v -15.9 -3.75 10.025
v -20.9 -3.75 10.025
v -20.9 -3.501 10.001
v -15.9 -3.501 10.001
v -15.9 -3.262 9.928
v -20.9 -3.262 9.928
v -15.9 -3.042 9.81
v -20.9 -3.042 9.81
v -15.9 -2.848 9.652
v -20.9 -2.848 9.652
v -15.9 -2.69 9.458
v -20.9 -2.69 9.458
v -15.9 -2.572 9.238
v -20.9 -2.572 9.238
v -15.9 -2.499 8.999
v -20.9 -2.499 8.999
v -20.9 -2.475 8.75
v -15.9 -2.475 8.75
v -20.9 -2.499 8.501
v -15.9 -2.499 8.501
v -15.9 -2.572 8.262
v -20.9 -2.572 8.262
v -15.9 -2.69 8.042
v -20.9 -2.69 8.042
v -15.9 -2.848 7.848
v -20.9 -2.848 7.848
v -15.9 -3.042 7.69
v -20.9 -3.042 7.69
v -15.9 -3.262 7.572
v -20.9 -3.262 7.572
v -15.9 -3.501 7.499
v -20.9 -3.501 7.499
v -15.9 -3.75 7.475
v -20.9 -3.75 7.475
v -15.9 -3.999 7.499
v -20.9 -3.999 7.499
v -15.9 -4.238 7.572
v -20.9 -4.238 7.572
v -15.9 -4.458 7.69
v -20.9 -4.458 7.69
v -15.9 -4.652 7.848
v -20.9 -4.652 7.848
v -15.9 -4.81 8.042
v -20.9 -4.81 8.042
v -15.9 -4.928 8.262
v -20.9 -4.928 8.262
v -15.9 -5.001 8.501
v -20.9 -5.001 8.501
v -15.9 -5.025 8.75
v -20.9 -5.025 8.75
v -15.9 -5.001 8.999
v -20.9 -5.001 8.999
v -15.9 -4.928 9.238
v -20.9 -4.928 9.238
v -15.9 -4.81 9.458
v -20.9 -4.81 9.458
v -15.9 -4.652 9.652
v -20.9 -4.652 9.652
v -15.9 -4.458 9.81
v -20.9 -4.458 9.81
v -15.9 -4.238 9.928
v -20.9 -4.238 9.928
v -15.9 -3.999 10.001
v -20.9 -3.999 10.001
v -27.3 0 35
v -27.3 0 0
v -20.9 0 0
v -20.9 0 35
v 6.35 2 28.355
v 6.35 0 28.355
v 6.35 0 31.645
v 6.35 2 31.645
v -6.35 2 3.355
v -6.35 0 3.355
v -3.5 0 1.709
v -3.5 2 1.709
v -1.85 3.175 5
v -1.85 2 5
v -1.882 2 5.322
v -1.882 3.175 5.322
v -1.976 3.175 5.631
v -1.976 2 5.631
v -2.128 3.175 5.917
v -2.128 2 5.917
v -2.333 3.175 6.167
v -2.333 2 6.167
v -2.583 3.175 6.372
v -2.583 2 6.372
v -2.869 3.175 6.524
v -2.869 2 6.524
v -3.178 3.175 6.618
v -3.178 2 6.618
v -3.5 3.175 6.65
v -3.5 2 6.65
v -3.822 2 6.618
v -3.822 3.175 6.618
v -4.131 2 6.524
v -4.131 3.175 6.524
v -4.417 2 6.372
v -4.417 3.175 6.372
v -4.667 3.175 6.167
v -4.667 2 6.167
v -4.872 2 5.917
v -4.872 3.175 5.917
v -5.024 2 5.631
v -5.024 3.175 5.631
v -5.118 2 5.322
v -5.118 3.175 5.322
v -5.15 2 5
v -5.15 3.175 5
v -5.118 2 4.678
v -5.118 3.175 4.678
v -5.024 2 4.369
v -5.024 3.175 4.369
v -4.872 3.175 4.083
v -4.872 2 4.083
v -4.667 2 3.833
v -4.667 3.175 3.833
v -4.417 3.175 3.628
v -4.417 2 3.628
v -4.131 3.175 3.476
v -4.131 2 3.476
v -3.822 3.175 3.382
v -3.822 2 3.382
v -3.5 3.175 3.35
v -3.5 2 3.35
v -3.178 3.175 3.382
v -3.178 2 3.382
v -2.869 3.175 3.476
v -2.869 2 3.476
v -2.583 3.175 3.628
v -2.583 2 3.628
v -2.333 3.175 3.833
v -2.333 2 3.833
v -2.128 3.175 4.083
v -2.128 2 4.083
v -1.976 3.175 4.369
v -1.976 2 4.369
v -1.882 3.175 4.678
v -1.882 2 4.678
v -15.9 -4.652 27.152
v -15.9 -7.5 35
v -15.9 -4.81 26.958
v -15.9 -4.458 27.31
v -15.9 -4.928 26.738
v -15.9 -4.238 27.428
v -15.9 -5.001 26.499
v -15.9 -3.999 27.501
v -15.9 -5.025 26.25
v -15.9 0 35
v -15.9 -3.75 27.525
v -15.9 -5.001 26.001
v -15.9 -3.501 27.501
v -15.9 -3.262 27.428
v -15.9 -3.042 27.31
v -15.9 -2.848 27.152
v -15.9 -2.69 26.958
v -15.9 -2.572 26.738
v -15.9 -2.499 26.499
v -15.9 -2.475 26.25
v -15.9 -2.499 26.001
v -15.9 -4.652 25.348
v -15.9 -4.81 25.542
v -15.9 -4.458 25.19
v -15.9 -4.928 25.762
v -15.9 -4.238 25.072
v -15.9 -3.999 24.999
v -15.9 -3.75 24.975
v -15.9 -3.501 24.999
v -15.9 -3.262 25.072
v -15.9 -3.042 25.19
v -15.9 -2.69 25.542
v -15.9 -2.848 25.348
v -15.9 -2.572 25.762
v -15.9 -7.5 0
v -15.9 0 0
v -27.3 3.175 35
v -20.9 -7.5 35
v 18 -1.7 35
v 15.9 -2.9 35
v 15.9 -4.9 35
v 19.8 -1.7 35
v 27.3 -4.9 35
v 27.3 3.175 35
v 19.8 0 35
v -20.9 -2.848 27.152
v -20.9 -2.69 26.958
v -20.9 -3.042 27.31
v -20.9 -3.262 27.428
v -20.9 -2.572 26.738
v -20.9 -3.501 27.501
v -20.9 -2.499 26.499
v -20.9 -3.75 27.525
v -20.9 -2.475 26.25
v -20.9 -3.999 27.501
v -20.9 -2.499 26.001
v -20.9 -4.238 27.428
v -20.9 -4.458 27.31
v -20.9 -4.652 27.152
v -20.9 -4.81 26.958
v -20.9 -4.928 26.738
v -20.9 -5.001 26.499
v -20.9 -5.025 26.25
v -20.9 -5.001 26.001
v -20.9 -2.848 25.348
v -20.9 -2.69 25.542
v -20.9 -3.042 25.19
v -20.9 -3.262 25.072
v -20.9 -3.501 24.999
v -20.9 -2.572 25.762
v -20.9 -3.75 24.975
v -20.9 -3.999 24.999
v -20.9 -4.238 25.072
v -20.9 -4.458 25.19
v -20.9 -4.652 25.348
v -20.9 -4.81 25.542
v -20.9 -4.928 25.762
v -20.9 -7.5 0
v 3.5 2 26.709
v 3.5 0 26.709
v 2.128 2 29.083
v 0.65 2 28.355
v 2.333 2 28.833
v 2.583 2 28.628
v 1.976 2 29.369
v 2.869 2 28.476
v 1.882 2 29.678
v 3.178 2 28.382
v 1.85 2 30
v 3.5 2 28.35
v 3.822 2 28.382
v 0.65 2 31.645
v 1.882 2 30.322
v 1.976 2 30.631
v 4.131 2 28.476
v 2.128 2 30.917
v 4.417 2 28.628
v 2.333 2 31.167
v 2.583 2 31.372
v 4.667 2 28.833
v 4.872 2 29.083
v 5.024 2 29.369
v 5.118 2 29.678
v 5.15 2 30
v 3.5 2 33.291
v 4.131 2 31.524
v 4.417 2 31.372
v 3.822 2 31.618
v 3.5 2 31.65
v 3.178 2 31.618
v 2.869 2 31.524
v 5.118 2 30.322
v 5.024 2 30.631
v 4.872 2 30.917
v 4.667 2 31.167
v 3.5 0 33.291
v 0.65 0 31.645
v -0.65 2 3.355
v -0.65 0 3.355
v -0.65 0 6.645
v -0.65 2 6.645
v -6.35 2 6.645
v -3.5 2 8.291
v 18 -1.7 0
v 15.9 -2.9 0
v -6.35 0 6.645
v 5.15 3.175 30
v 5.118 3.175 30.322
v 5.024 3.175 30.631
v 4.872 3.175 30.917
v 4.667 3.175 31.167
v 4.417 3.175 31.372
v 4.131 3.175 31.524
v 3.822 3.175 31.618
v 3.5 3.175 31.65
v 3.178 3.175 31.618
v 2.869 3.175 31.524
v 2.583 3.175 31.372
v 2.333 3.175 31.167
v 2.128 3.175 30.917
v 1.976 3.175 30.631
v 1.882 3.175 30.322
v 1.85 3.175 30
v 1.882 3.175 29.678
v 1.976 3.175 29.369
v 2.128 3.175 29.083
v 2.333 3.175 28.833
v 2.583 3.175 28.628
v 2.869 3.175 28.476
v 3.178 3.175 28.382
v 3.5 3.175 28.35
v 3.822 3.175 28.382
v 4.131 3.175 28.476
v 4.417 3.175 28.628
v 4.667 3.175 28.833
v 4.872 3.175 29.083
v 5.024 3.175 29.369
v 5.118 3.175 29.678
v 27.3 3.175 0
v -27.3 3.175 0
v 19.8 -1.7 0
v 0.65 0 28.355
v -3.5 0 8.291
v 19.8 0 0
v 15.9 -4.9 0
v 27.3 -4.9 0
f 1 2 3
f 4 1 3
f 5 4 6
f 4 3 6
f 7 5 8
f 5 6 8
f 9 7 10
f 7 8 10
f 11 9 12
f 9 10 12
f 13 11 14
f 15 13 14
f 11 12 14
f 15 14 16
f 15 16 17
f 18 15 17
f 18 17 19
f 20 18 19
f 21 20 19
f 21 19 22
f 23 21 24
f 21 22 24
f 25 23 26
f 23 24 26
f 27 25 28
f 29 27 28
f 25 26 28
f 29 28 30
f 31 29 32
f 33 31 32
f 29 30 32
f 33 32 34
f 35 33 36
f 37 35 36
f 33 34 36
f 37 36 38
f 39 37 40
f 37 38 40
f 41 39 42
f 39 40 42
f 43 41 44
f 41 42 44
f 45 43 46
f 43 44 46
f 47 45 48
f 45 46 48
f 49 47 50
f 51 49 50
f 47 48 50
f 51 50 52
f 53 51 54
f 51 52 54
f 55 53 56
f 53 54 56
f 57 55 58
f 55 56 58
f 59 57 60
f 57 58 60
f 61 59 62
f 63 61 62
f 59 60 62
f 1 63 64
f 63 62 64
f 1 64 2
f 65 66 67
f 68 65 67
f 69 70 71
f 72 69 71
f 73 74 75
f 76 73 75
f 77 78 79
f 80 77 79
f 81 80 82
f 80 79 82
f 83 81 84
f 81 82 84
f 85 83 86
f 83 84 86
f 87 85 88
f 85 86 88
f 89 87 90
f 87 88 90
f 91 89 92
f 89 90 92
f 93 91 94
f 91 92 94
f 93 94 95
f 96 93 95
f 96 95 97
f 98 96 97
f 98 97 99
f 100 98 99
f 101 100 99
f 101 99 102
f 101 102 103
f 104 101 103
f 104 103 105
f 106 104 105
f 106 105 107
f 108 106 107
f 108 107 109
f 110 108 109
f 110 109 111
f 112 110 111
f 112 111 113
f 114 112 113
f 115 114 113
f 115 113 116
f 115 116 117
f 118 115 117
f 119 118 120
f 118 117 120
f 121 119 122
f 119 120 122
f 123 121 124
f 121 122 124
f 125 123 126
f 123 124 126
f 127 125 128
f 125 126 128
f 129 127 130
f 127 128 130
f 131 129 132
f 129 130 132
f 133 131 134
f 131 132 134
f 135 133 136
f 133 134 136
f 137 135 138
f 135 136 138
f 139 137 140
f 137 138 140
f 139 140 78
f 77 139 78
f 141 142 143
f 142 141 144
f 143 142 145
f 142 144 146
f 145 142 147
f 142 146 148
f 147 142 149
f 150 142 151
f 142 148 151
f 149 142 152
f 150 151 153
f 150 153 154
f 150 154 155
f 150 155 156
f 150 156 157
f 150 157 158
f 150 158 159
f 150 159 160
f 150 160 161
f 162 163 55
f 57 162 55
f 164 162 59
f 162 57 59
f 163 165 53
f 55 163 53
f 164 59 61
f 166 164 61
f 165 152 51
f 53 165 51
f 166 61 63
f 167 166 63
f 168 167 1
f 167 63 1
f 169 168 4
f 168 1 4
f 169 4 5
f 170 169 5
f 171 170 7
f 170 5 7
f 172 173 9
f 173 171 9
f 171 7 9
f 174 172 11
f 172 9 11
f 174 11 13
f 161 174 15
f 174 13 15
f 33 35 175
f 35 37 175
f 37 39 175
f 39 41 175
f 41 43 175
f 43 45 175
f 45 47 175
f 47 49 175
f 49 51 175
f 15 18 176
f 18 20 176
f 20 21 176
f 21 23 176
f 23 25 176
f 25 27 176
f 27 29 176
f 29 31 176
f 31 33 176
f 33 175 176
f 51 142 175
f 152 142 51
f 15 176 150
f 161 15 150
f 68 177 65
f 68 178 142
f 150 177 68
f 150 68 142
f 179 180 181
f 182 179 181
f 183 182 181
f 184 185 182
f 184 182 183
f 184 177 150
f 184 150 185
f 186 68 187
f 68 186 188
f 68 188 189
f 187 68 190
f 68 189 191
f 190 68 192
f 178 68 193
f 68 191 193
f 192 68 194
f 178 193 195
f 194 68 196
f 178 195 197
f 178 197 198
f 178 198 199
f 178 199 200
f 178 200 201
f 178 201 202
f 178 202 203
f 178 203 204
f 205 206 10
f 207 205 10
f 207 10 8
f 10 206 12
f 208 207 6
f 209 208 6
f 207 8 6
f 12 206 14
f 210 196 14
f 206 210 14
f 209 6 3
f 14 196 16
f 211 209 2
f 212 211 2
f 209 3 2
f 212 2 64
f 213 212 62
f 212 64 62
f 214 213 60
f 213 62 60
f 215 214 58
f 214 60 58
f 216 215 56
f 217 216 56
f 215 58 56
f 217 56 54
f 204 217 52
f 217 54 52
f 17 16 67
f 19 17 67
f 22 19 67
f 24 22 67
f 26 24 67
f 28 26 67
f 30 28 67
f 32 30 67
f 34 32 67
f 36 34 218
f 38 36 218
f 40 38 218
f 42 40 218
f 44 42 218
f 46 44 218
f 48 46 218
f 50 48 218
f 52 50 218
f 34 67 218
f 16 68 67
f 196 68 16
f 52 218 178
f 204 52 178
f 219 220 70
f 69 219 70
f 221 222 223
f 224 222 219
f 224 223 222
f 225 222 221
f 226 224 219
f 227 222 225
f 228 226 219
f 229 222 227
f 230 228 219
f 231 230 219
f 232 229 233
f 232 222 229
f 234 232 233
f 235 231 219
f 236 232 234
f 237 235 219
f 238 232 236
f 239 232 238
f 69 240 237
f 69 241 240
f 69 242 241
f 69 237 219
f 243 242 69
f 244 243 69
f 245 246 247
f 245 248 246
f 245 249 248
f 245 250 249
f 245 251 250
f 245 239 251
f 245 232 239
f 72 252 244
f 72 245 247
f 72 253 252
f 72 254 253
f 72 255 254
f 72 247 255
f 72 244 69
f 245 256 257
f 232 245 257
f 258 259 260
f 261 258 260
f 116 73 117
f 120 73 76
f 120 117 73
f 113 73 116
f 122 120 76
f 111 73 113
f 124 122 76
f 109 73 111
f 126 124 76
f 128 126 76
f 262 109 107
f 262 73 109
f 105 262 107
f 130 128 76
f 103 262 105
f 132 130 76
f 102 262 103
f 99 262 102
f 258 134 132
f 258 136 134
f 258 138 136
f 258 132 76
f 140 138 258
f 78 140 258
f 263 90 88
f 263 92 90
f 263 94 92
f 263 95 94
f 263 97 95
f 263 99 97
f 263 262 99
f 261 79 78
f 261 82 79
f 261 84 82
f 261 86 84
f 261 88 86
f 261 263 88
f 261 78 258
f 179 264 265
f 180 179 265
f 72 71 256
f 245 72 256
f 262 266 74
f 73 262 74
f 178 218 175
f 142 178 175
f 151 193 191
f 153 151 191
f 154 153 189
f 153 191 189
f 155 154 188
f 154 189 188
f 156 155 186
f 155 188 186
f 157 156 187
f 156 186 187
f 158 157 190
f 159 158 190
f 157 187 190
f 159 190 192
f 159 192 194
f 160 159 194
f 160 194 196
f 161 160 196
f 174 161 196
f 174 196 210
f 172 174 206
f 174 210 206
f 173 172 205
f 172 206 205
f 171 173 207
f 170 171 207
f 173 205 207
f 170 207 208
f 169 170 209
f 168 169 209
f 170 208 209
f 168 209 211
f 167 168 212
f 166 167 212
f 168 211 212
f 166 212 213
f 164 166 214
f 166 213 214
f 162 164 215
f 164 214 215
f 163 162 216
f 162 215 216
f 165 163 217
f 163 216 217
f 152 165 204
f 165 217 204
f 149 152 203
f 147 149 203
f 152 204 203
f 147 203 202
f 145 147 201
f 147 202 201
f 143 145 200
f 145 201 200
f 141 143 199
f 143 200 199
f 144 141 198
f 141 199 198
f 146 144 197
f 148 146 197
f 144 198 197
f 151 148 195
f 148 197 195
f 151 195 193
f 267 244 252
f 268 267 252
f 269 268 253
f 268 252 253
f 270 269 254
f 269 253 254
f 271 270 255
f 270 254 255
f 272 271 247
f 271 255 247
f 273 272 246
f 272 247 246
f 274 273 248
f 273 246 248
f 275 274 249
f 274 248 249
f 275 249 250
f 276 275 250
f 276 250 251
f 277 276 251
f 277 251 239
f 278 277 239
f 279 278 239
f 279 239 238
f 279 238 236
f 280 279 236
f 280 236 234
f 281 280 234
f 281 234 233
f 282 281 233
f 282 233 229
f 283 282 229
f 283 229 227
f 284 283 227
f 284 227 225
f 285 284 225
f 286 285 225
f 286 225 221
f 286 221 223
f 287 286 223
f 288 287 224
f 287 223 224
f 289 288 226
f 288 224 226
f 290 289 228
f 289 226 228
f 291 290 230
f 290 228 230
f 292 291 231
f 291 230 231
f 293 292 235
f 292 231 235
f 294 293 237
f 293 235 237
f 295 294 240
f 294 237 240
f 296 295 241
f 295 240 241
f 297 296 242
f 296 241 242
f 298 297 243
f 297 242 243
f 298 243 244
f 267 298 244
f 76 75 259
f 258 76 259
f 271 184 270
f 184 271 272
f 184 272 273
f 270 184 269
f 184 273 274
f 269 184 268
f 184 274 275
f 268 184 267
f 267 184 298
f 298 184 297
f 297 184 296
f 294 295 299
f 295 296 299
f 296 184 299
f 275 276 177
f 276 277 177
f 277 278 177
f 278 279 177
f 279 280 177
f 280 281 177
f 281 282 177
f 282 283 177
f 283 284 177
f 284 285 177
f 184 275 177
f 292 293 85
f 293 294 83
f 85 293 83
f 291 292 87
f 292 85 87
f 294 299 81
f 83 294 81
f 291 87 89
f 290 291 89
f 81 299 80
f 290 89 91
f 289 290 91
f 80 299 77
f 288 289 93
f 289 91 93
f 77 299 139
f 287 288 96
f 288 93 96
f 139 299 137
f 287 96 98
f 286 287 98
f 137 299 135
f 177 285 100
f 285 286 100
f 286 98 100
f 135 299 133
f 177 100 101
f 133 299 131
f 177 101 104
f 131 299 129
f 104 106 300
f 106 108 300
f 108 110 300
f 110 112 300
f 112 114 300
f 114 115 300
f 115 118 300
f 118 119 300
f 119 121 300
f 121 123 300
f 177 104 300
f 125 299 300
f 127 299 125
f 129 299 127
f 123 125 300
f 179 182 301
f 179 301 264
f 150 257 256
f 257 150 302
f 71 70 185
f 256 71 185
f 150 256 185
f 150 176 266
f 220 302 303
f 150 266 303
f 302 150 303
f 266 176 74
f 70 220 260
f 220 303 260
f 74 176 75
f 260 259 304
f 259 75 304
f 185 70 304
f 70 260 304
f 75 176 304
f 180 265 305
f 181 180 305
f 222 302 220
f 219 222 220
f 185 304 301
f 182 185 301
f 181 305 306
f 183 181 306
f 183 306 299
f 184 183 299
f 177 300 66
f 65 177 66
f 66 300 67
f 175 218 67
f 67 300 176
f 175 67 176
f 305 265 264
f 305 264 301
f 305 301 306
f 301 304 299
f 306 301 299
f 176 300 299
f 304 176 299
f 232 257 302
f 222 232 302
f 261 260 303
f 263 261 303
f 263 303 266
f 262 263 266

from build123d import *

# Parameters (mm, degrees)
BOSS_EXTRUDE1_DEPTH = 35
SKETCH2_R           = 1.275
CUT_EXTRUDE1_DEPTH  = 5
SKETCH5_R           = 1.65
CUT_EXTRUDE2_DEPTH  = 2
SKETCH6_R           = 1.65
CUT_EXTRUDE3_DEPTH  = 4.175


with BuildPart() as part:
    # Sketch1 → Boss-Extrude1 (new body)
    with BuildSketch(Plane.XY):
        Polygon((0, 0), (19.8, 0), (19.8, -1.7), (18, -1.7), (15.9, -2.9), (15.9, -4.9), (27.3, -4.9), (27.3, 3.175), (-27.3, 3.175), (-27.3, 0), (-20.9, 0), (-20.9, -7.5), (-15.9, -7.5), (-15.9, 0), align=None)
    extrude(amount=BOSS_EXTRUDE1_DEPTH)

    # Sketch2 → Cut-Extrude1 (cut)
    with BuildSketch(Plane.ZY.offset(20.9)):
        with Locations((8.75, -3.75)):
            Circle(SKETCH2_R)
        with Locations((26.25, -3.75)):
            Circle(SKETCH2_R)
    extrude(amount=-CUT_EXTRUDE1_DEPTH, mode=Mode.SUBTRACT)

    # Sketch5 → Cut-Extrude2 (cut)
    with BuildSketch(Plane.XZ):
        Polygon((6.35, 28.354551733), (6.35, 31.645448267), (3.5, 33.290896534), (0.65, 31.645448267), (0.65, 28.354551733), (3.5, 26.709103466), align=None)
        with Locations((3.5, 30)):
            Circle(SKETCH5_R, mode=Mode.SUBTRACT)
        Polygon((-0.65, 6.645448267), (-3.5, 8.290896534), (-6.35, 6.645448267), (-6.35, 3.354551733), (-3.5, 1.709103466), (-0.65, 3.354551733), align=None)
        with Locations((-3.5, 5)):
            Circle(SKETCH5_R, mode=Mode.SUBTRACT)
    extrude(amount=-CUT_EXTRUDE2_DEPTH, mode=Mode.SUBTRACT)

    # Sketch6 → Cut-Extrude3 (cut, through all)
    with BuildSketch(Plane.XZ):
        with Locations((3.5, 30)):
            Circle(SKETCH6_R)
        with Locations((-3.5, 5)):
            Circle(SKETCH6_R)
    extrude(amount=-CUT_EXTRUDE3_DEPTH, mode=Mode.SUBTRACT)


solid = part.part
